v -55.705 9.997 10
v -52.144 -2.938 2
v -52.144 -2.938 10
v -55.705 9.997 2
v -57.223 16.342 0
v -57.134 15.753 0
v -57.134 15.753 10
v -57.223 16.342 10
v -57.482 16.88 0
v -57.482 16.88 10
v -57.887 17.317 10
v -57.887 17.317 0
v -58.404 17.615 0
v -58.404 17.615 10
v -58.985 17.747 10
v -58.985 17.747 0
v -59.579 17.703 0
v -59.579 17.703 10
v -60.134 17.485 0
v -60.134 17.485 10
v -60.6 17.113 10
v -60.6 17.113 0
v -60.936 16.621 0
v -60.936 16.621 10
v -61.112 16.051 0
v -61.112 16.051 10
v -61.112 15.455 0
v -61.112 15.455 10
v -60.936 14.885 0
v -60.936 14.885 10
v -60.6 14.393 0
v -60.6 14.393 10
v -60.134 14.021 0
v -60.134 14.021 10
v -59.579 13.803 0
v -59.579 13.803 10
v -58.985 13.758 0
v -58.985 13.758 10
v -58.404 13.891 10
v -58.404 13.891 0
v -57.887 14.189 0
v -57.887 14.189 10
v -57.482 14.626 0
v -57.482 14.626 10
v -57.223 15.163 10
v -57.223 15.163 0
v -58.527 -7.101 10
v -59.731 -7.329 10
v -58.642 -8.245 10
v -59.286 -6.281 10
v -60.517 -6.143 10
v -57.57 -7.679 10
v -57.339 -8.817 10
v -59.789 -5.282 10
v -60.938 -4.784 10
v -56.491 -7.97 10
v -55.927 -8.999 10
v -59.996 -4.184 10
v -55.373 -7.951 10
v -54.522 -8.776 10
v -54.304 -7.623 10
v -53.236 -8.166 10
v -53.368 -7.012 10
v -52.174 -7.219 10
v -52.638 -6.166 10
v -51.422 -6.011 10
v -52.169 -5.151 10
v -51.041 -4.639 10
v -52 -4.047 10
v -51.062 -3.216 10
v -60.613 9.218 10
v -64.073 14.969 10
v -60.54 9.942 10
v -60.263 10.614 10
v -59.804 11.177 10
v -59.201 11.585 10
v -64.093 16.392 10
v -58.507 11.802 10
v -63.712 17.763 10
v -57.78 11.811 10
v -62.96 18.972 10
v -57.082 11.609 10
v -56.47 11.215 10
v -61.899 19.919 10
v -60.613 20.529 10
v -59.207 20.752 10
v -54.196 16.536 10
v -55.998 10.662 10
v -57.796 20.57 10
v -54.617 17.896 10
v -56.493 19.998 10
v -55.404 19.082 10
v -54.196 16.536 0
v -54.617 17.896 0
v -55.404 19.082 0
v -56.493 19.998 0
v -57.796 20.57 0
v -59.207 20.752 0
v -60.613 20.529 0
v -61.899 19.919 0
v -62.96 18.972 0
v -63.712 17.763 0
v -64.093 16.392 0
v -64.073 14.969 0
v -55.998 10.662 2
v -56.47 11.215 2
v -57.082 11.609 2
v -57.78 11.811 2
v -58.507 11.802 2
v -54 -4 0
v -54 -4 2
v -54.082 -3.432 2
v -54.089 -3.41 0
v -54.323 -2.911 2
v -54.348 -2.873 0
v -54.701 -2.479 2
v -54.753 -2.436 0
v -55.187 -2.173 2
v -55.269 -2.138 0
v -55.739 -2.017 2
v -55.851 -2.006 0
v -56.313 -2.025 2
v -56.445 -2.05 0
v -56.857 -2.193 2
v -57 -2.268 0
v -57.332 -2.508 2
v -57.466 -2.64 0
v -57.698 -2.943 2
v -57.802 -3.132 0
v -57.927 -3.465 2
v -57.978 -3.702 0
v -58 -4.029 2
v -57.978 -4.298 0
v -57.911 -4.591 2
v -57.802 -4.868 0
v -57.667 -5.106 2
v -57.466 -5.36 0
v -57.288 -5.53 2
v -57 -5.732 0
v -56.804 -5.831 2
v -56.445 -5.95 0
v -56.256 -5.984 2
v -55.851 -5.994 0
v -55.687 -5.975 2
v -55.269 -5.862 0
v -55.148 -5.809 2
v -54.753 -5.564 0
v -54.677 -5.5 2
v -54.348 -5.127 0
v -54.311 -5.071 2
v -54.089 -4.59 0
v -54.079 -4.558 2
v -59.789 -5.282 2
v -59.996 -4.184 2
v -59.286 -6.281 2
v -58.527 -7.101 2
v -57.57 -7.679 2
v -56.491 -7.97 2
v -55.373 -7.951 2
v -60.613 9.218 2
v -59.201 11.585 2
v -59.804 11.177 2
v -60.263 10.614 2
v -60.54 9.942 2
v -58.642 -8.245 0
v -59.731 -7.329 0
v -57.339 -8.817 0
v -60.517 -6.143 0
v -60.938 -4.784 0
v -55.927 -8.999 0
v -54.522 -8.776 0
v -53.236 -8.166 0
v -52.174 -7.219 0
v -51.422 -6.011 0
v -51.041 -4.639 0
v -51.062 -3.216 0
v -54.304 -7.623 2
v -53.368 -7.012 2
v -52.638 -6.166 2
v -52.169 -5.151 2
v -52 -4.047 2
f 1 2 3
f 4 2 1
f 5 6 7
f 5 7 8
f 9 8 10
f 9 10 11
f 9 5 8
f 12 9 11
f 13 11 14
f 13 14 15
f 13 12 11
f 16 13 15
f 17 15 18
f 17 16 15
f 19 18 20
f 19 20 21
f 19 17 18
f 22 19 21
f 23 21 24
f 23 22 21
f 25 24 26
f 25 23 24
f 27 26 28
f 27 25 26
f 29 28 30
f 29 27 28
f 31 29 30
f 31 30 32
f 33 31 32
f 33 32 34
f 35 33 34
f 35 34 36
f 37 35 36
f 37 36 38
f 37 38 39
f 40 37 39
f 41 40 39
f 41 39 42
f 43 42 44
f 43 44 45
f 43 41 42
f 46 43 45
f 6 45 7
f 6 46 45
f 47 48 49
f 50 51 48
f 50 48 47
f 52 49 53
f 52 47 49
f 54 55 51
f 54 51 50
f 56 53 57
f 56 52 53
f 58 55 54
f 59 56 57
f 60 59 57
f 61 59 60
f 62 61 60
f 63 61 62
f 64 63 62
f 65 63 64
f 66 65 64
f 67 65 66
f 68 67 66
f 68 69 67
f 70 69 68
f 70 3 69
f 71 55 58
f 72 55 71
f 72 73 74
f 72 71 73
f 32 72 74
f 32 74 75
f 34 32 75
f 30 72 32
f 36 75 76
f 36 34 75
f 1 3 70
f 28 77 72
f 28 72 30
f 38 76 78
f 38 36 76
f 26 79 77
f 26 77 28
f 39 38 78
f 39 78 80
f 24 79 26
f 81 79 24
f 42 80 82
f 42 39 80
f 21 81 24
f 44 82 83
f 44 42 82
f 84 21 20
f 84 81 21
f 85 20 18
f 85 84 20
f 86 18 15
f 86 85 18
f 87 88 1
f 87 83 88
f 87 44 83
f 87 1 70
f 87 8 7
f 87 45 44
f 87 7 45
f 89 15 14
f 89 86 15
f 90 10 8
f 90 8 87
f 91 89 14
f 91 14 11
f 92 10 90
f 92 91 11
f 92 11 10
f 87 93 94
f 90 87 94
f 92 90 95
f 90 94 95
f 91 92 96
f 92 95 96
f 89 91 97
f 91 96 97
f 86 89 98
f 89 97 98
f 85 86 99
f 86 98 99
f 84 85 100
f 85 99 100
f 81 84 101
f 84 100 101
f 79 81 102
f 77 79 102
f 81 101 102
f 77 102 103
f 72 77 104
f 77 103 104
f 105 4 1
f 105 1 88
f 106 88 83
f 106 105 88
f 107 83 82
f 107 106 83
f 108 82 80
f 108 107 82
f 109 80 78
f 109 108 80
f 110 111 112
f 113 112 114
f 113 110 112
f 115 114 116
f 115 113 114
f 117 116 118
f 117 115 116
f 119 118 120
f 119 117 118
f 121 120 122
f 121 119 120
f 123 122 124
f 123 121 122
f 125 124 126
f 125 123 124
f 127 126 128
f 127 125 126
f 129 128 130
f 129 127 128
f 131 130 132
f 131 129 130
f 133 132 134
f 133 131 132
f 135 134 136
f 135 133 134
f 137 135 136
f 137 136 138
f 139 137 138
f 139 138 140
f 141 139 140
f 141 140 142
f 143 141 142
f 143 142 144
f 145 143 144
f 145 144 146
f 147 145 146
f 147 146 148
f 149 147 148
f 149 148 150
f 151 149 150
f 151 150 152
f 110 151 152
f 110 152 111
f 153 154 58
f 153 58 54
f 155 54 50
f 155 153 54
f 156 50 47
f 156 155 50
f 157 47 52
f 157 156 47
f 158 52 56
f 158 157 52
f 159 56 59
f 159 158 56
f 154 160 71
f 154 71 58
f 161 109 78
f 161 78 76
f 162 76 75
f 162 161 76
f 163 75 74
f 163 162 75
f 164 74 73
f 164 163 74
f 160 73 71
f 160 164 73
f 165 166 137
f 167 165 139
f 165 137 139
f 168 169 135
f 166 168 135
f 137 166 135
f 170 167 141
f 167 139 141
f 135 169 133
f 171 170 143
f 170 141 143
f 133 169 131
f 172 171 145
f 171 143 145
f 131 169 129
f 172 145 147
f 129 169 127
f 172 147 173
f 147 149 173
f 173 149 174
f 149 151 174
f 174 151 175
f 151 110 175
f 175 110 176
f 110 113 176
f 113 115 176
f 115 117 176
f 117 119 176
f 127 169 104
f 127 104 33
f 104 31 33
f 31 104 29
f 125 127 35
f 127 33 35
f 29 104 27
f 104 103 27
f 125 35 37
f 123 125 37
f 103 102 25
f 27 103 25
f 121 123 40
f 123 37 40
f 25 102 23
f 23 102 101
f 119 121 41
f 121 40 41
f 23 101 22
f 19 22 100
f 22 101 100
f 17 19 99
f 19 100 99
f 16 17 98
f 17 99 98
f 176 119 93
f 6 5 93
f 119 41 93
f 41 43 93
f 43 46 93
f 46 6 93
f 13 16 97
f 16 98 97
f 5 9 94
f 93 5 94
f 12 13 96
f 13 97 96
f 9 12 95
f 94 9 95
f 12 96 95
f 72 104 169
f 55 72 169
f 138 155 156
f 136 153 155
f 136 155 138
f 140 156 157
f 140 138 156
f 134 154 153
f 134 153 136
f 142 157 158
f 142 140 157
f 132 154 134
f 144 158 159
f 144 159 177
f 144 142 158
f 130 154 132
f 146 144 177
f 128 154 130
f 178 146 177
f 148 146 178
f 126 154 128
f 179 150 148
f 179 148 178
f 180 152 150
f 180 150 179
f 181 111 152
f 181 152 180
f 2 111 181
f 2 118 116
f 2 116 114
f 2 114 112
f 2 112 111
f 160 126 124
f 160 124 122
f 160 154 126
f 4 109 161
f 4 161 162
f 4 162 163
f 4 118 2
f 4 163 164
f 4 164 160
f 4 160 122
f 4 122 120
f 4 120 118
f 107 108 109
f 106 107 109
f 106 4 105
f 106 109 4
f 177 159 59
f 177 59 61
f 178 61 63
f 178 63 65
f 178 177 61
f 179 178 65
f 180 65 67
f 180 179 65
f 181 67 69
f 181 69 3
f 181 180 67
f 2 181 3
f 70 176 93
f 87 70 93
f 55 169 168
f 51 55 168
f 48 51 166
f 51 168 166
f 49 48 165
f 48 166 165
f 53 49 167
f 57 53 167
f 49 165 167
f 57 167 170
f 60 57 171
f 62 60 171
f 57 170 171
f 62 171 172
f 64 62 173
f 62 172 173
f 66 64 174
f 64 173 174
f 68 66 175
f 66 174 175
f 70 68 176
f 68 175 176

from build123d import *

# Parameters (mm, degrees)
SKETCH1_R           = 2
BOSS_EXTRUDE1_DEPTH = 10
CUT_EXTRUDE1_START  = -8
CUT_EXTRUDE1_DEPTH  = 8


with BuildPart() as part:
    # Sketch1 → Boss-Extrude1 (new body)
    with BuildSketch(Plane.XY):
        with BuildLine():
            Line((-64.072556879, 14.969286371), (-60.938217786, -4.783584773))
            ThreePointArc((-60.938217786, -4.783584773), (-55.216415227, -8.938217786), (-51.061782214, -3.216415227))
            Line((-51.061782214, -3.216415227), (-54.196121307, 16.536455918))
            ThreePointArc((-54.196121307, 16.536455918), (-59.917923866, 20.691088931), (-64.072556879, 14.969286371))
        make_face()
        with Locations((-59.134339093, 15.752871145)):
            Circle(SKETCH1_R, mode=Mode.SUBTRACT)
        with Locations((-56, -4)):
            Circle(SKETCH1_R, mode=Mode.SUBTRACT)
    extrude(amount=BOSS_EXTRUDE1_DEPTH)

    # Sketch2 → Cut-Extrude1 (cut)
    with BuildSketch(Plane.XY.offset(10).offset(CUT_EXTRUDE1_START)):
        with BuildLine():
            ThreePointArc((-55.686566091, -5.975287114), (-57.975287114, -4.313433909), (-56.313433909, -2.024712886))
            Line((-56.313433909, -2.024712886), (-57.567169546, 5.876435572))
            Line((-57.567169546, 5.876435572), (-58.507471274, 11.802296916))
            ThreePointArc((-58.507471274, 11.802296916), (-60.053776286, 10.912358208), (-60.613031521, 9.218167051))
            Line((-60.613031521, 9.218167051), (-59.995764214, -4.184033555))
            ThreePointArc((-59.995764214, -4.184033555), (-58.526672296, -7.100955838), (-55.373132181, -7.950574229))
            Line((-55.373132181, -7.950574229), (-55.686566091, -5.975287114))
        make_face()
        with BuildLine():
            Line((-57.567169546, 5.876435572), (-56.313433909, -2.024712886))
            ThreePointArc((-56.313433909, -2.024712886), (-54.701321406, -2.479002331), (-54, -4))
            ThreePointArc((-54, -4), (-54.479002331, -5.298678594), (-55.686566091, -5.975287114))
            Line((-55.686566091, -5.975287114), (-55.373132181, -7.950574229))
            ThreePointArc((-55.373132181, -7.950574229), (-52.637503946, -6.166476468), (-52.143539746, -2.938061061))
            Line((-52.143539746, -2.938061061), (-55.705391229, 9.996899859))
            ThreePointArc((-55.705391229, 9.996899859), (-56.761631095, 11.434748057), (-58.507471274, 11.802296916))
            Line((-58.507471274, 11.802296916), (-57.567169546, 5.876435572))
        make_face()
    extrude(amount=CUT_EXTRUDE1_DEPTH, mode=Mode.SUBTRACT)


solid = part.part
